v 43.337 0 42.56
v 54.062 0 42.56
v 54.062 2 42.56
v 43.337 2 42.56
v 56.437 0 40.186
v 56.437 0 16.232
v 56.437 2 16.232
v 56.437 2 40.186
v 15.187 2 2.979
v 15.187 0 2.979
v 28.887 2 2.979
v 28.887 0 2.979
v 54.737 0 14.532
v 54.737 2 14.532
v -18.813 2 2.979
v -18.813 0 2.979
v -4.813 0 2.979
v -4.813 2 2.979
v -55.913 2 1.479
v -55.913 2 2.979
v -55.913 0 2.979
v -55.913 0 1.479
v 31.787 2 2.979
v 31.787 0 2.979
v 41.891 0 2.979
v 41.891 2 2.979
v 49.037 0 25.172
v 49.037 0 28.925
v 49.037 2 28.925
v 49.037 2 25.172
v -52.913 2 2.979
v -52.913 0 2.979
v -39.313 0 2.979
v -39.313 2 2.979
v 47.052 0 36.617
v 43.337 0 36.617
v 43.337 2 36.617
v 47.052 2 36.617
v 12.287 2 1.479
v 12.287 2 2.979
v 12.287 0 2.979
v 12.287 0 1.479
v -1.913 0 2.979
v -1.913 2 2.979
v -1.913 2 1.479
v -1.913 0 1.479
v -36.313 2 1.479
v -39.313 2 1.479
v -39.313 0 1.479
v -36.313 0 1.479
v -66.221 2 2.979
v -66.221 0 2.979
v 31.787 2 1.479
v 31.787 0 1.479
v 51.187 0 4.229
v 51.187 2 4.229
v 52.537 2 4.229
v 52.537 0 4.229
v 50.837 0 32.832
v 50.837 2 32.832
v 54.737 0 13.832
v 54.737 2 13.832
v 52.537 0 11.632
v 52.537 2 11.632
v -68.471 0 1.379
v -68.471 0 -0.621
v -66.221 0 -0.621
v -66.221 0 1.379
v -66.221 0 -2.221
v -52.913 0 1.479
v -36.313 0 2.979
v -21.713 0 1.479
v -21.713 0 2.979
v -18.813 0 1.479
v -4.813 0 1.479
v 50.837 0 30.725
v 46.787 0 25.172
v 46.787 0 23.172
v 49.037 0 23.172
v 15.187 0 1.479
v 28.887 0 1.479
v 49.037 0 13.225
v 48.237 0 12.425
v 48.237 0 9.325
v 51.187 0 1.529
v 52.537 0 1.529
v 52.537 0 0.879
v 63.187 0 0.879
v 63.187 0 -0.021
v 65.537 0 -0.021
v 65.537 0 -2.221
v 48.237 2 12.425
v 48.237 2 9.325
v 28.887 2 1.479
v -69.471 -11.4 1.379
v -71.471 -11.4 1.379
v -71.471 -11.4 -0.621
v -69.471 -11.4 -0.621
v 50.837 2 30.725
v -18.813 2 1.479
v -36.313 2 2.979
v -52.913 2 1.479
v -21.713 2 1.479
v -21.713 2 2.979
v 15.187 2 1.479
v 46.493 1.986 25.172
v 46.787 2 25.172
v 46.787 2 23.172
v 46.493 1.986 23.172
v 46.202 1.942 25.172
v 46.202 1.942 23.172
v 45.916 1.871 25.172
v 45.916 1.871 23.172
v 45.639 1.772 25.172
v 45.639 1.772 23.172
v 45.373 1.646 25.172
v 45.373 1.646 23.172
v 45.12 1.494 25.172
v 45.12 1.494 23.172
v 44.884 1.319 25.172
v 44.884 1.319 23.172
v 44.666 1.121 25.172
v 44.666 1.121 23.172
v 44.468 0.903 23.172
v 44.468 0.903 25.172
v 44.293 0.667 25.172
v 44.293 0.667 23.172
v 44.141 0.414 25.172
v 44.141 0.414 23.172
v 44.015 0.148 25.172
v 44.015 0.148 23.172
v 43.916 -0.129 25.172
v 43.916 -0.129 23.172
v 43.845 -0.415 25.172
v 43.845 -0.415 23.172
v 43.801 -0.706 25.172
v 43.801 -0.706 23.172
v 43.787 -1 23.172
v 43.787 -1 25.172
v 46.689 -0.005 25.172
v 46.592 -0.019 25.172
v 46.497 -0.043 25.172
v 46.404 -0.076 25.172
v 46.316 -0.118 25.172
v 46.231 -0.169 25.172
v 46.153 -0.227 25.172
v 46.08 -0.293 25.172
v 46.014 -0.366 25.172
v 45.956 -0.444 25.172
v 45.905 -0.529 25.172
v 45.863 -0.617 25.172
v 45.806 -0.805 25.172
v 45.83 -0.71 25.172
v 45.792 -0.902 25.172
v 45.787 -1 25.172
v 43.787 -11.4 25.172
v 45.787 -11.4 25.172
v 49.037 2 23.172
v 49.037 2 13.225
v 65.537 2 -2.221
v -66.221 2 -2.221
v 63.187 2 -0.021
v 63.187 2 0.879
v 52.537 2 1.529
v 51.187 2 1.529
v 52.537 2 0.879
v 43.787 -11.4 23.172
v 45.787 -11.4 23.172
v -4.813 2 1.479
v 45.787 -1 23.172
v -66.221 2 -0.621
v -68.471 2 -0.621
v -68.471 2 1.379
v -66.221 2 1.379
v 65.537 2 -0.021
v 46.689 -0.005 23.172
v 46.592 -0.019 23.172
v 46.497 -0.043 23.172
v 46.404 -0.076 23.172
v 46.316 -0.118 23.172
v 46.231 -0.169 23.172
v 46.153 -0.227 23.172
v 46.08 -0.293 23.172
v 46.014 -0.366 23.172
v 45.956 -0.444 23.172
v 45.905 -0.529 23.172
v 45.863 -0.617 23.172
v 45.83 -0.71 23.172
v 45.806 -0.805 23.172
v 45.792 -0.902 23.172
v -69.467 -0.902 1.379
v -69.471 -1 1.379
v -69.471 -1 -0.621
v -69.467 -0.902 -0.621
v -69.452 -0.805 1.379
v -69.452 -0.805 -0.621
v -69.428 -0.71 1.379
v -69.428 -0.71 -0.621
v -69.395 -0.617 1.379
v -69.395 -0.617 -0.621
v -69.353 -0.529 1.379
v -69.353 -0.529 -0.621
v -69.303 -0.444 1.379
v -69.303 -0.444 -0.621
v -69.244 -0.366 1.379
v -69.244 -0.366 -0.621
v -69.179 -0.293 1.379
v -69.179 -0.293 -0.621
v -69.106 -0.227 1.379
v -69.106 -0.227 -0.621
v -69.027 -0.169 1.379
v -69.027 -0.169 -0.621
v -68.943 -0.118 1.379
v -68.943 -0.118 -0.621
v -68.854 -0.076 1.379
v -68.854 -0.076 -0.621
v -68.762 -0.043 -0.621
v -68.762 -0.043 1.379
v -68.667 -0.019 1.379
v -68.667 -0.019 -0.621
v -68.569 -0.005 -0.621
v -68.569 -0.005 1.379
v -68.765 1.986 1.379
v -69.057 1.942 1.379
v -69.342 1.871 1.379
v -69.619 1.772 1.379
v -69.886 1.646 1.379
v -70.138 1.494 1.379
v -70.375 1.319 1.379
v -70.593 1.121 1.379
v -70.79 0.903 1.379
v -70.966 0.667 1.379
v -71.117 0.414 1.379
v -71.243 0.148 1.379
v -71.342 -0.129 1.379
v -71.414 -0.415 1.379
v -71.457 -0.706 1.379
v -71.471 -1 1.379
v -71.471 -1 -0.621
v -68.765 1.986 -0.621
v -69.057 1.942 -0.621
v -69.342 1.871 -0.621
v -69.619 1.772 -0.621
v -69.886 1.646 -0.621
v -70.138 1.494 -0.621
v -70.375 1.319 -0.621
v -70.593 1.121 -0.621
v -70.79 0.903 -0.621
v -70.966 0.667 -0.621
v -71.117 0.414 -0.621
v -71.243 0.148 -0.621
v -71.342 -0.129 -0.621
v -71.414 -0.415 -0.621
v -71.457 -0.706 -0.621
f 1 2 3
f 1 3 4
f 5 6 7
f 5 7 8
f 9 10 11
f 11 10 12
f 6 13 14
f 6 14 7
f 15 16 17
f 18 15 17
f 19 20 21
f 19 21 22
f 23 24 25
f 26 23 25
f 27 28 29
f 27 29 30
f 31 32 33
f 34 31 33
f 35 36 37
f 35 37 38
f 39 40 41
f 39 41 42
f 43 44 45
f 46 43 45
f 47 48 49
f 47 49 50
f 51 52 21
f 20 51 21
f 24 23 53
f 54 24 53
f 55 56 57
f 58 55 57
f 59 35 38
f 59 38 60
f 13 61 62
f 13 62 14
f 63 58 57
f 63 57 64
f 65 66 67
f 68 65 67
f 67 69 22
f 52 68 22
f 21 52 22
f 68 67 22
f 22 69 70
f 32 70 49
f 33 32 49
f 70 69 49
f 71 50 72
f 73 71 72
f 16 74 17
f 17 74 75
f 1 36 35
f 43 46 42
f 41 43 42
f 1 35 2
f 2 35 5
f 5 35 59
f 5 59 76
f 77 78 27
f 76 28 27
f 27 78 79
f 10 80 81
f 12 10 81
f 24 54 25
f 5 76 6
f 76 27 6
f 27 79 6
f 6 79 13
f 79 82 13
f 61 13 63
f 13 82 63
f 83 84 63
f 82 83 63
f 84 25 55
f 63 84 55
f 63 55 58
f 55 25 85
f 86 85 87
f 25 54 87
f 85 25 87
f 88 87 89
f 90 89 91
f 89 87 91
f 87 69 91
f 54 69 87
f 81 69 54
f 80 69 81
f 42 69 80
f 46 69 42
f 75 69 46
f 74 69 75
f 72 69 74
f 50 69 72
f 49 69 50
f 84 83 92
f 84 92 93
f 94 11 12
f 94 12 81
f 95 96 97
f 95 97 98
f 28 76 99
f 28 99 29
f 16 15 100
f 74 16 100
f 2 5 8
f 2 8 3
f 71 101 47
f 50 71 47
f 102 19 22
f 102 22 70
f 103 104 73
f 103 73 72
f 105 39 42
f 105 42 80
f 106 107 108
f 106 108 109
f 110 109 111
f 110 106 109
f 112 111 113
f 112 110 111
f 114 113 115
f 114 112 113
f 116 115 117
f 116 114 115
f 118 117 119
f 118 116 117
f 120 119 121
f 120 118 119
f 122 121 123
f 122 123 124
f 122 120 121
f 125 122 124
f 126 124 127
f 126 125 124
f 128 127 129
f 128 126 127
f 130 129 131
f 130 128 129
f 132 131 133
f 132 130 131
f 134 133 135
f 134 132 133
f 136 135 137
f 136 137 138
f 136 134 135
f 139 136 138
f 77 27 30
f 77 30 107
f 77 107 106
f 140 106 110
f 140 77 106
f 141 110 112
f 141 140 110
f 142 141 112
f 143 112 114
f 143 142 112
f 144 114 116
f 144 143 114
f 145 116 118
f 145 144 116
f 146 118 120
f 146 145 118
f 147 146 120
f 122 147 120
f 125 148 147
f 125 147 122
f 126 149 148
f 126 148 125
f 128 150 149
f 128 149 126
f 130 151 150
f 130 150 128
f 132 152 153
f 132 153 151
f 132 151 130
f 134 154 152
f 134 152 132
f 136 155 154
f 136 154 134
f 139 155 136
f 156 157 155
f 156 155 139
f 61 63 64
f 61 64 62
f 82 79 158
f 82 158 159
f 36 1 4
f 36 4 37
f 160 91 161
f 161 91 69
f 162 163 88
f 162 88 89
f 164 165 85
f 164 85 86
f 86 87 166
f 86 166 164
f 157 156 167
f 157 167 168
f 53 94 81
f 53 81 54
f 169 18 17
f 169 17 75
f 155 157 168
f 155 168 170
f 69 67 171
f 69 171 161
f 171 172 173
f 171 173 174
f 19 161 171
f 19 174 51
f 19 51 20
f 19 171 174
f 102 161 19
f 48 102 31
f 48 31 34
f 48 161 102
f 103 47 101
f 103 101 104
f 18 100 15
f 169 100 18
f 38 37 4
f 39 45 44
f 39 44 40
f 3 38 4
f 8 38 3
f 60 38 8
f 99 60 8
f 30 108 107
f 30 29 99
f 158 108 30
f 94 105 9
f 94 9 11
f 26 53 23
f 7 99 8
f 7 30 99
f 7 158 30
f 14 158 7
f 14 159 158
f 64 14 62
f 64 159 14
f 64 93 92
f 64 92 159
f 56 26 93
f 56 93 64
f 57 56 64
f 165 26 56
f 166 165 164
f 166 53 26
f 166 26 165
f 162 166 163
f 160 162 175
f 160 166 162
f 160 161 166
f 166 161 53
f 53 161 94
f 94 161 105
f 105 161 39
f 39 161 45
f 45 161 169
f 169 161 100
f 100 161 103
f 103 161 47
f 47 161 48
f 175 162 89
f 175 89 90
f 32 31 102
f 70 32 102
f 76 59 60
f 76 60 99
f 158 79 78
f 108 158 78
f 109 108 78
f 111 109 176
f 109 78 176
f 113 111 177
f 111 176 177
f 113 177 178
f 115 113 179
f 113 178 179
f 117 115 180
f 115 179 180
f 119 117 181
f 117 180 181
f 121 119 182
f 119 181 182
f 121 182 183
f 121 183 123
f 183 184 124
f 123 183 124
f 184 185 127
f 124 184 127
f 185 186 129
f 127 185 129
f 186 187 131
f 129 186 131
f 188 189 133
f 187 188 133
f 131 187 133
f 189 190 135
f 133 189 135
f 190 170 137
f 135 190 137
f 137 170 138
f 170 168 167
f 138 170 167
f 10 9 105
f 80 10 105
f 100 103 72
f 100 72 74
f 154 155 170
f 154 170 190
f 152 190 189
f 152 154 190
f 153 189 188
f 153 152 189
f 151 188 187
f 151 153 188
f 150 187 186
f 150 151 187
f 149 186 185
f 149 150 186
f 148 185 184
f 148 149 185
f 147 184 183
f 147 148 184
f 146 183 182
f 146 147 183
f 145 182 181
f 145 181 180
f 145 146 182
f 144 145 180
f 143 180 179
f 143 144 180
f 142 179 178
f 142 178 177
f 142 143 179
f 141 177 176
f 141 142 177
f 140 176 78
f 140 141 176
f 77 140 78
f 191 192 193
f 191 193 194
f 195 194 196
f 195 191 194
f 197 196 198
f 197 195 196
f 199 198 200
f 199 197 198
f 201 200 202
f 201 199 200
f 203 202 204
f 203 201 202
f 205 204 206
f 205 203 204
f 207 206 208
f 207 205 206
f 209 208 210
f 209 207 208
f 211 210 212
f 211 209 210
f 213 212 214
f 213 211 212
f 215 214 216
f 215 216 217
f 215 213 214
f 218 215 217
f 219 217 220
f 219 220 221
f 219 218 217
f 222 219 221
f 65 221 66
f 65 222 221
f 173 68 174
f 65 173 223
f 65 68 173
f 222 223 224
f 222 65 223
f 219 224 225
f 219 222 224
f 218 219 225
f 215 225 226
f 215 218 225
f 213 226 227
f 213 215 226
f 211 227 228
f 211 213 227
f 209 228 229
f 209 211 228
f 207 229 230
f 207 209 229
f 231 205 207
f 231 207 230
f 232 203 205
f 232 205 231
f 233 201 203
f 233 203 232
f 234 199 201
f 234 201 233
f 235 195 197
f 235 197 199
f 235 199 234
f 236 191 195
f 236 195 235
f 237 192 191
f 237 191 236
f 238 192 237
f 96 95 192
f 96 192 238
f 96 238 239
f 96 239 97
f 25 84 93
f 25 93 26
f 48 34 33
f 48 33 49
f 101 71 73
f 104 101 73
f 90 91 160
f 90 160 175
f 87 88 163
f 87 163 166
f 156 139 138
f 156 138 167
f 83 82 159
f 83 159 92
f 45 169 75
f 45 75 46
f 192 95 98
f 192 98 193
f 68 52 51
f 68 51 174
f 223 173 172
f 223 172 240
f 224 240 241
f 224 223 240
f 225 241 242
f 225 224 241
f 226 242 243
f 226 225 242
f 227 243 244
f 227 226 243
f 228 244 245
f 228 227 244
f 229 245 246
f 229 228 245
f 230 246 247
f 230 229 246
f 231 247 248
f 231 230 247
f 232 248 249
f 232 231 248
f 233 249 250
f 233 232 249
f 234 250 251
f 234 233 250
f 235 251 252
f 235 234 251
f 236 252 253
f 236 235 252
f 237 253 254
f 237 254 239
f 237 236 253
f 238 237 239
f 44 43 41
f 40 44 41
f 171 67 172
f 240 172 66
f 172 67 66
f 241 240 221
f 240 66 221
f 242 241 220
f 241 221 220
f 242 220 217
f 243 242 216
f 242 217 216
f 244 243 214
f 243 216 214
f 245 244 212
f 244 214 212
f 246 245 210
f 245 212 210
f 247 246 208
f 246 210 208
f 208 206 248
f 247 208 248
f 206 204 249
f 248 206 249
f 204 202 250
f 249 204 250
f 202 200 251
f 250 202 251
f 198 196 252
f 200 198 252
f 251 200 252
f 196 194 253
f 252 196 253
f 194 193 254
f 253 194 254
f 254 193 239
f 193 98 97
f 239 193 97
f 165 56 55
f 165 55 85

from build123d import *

# Parameters (mm, degrees)
SKETCH1_W           = 2.25
SKETCH1_H           = 2
BOSS_EXTRUDE1_DEPTH = 2
SKETCH12_W          = 3
SKETCH12_H          = 2.15
SKETCH12_W_2        = 2.99999908
SKETCH12_W_3        = 2.89999928
SKETCH12_W_4        = 2
SKETCH12_H_2        = 2.69999968
SKETCH12_H_3        = 2
CUT_EXTRUDE1_DEPTH  = 10
EDGE_FLANGE1_DEPTH  = 2
EDGE_FLANGE2_DEPTH  = 2


# Sheet-metal steps are written as plain solids
with BuildPart() as part:
    # Sketch1 → Boss-Extrude1 (new body)
    with BuildSketch(Plane(origin=(0, 0, 0), x_dir=(1, 0, 0), z_dir=(0, 1, 0))):
        with Locations((47.911990623, -24.171897133)):
            Rectangle(SKETCH1_W, SKETCH1_H)
        with Locations((-67.346417942, -0.378635375)):
            Rectangle(SKETCH1_W, SKETCH1_H)
        Polygon((49.036990623, -28.925083001), (49.036990623, -13.225081484), (48.236992223, -12.425083084), (48.236992223, -9.325081664), (41.890545314, -2.978634755), (-54.913007717, -2.978634755), (-66.221417942, -2.978634755), (-66.221417942, 2.221364005), (-54.913007717, 2.221364005), (65.536992183, 2.221364005), (65.536992183, -0.878636415), (52.536992783, -0.878636415), (52.536992783, -11.632189325), (54.736991299, -13.832187841), (54.736993839, -14.532188981), (56.436992603, -16.232187745), (56.436992603, -40.185676156), (54.062239478, -42.560429281), (43.336991863, -42.560429281), (43.336991863, -36.616688347), (47.052491322, -36.616688347), (50.836992103, -32.832187565), (50.836992103, -30.725081941), align=None)
    extrude(amount=BOSS_EXTRUDE1_DEPTH)

    # Sketch12 → Cut-Extrude1 (cut)
    with BuildSketch(Plane(origin=(0, 2, 0), x_dir=(1, 0, 0), z_dir=(0, 1, 0))):
        with Locations((-54.413012042, -2.553635995)):
            Rectangle(SKETCH12_W, SKETCH12_H)
        with Locations((-37.813011762, -2.553635995)):
            Rectangle(SKETCH12_W_2, SKETCH12_H)
        with Locations((-20.263011302, -2.553635995)):
            Rectangle(SKETCH12_W_3, SKETCH12_H)
        with Locations((-3.363012082, -2.553635995)):
            Rectangle(SKETCH12_W_3, SKETCH12_H)
        with Locations((13.736989278, -2.553635995)):
            Rectangle(SKETCH12_W_3, SKETCH12_H)
        with Locations((30.336989098, -2.553635995)):
            Rectangle(SKETCH12_W_3, SKETCH12_H)
        with Locations((52.186988038, -2.878639758)):
            Rectangle(SKETCH12_W_4, SKETCH12_H_2)
        with Locations((64.636989078, -0.978635995)):
            Rectangle(SKETCH12_W_3, SKETCH12_H_3)
    extrude(amount=-CUT_EXTRUDE1_DEPTH, mode=Mode.SUBTRACT)

    # Edge-Flange1 section (across the edge) → Edge-Flange1 (add)
    with BuildSketch(Plane(origin=(-69.471417942, 0, 1.378635375), x_dir=(1, 0, 0), z_dir=(0, 0, -1))):
        with BuildLine():
            Line((-2, 1), (-2, 11.4))
            Line((-2, 11.4), (0, 11.4))
            Line((0, 11.4), (0, 1))
            ThreePointArc((0, 1), (0.292893219, 0.292893219), (1, 0))
            Line((1, 0), (1, -2))
            ThreePointArc((1, -2), (-1.121320344, -1.121320344), (-2, 1))
        make_face()
    extrude(amount=EDGE_FLANGE1_DEPTH)

    # Edge-Flange2 section (across the edge) → Edge-Flange2 (add)
    with BuildSketch(Plane(origin=(45.786990623, 0, 25.171897133), x_dir=(1, 0, 0), z_dir=(0, 0, -1))):
        with BuildLine():
            Line((-2, 1), (-2, 11.4))
            Line((-2, 11.4), (0, 11.4))
            Line((0, 11.4), (0, 1))
            ThreePointArc((0, 1), (0.292893219, 0.292893219), (1, 0))
            Line((1, 0), (1, -2))
            ThreePointArc((1, -2), (-1.121320344, -1.121320344), (-2, 1))
        make_face()
    extrude(amount=EDGE_FLANGE2_DEPTH)


solid = part.part
